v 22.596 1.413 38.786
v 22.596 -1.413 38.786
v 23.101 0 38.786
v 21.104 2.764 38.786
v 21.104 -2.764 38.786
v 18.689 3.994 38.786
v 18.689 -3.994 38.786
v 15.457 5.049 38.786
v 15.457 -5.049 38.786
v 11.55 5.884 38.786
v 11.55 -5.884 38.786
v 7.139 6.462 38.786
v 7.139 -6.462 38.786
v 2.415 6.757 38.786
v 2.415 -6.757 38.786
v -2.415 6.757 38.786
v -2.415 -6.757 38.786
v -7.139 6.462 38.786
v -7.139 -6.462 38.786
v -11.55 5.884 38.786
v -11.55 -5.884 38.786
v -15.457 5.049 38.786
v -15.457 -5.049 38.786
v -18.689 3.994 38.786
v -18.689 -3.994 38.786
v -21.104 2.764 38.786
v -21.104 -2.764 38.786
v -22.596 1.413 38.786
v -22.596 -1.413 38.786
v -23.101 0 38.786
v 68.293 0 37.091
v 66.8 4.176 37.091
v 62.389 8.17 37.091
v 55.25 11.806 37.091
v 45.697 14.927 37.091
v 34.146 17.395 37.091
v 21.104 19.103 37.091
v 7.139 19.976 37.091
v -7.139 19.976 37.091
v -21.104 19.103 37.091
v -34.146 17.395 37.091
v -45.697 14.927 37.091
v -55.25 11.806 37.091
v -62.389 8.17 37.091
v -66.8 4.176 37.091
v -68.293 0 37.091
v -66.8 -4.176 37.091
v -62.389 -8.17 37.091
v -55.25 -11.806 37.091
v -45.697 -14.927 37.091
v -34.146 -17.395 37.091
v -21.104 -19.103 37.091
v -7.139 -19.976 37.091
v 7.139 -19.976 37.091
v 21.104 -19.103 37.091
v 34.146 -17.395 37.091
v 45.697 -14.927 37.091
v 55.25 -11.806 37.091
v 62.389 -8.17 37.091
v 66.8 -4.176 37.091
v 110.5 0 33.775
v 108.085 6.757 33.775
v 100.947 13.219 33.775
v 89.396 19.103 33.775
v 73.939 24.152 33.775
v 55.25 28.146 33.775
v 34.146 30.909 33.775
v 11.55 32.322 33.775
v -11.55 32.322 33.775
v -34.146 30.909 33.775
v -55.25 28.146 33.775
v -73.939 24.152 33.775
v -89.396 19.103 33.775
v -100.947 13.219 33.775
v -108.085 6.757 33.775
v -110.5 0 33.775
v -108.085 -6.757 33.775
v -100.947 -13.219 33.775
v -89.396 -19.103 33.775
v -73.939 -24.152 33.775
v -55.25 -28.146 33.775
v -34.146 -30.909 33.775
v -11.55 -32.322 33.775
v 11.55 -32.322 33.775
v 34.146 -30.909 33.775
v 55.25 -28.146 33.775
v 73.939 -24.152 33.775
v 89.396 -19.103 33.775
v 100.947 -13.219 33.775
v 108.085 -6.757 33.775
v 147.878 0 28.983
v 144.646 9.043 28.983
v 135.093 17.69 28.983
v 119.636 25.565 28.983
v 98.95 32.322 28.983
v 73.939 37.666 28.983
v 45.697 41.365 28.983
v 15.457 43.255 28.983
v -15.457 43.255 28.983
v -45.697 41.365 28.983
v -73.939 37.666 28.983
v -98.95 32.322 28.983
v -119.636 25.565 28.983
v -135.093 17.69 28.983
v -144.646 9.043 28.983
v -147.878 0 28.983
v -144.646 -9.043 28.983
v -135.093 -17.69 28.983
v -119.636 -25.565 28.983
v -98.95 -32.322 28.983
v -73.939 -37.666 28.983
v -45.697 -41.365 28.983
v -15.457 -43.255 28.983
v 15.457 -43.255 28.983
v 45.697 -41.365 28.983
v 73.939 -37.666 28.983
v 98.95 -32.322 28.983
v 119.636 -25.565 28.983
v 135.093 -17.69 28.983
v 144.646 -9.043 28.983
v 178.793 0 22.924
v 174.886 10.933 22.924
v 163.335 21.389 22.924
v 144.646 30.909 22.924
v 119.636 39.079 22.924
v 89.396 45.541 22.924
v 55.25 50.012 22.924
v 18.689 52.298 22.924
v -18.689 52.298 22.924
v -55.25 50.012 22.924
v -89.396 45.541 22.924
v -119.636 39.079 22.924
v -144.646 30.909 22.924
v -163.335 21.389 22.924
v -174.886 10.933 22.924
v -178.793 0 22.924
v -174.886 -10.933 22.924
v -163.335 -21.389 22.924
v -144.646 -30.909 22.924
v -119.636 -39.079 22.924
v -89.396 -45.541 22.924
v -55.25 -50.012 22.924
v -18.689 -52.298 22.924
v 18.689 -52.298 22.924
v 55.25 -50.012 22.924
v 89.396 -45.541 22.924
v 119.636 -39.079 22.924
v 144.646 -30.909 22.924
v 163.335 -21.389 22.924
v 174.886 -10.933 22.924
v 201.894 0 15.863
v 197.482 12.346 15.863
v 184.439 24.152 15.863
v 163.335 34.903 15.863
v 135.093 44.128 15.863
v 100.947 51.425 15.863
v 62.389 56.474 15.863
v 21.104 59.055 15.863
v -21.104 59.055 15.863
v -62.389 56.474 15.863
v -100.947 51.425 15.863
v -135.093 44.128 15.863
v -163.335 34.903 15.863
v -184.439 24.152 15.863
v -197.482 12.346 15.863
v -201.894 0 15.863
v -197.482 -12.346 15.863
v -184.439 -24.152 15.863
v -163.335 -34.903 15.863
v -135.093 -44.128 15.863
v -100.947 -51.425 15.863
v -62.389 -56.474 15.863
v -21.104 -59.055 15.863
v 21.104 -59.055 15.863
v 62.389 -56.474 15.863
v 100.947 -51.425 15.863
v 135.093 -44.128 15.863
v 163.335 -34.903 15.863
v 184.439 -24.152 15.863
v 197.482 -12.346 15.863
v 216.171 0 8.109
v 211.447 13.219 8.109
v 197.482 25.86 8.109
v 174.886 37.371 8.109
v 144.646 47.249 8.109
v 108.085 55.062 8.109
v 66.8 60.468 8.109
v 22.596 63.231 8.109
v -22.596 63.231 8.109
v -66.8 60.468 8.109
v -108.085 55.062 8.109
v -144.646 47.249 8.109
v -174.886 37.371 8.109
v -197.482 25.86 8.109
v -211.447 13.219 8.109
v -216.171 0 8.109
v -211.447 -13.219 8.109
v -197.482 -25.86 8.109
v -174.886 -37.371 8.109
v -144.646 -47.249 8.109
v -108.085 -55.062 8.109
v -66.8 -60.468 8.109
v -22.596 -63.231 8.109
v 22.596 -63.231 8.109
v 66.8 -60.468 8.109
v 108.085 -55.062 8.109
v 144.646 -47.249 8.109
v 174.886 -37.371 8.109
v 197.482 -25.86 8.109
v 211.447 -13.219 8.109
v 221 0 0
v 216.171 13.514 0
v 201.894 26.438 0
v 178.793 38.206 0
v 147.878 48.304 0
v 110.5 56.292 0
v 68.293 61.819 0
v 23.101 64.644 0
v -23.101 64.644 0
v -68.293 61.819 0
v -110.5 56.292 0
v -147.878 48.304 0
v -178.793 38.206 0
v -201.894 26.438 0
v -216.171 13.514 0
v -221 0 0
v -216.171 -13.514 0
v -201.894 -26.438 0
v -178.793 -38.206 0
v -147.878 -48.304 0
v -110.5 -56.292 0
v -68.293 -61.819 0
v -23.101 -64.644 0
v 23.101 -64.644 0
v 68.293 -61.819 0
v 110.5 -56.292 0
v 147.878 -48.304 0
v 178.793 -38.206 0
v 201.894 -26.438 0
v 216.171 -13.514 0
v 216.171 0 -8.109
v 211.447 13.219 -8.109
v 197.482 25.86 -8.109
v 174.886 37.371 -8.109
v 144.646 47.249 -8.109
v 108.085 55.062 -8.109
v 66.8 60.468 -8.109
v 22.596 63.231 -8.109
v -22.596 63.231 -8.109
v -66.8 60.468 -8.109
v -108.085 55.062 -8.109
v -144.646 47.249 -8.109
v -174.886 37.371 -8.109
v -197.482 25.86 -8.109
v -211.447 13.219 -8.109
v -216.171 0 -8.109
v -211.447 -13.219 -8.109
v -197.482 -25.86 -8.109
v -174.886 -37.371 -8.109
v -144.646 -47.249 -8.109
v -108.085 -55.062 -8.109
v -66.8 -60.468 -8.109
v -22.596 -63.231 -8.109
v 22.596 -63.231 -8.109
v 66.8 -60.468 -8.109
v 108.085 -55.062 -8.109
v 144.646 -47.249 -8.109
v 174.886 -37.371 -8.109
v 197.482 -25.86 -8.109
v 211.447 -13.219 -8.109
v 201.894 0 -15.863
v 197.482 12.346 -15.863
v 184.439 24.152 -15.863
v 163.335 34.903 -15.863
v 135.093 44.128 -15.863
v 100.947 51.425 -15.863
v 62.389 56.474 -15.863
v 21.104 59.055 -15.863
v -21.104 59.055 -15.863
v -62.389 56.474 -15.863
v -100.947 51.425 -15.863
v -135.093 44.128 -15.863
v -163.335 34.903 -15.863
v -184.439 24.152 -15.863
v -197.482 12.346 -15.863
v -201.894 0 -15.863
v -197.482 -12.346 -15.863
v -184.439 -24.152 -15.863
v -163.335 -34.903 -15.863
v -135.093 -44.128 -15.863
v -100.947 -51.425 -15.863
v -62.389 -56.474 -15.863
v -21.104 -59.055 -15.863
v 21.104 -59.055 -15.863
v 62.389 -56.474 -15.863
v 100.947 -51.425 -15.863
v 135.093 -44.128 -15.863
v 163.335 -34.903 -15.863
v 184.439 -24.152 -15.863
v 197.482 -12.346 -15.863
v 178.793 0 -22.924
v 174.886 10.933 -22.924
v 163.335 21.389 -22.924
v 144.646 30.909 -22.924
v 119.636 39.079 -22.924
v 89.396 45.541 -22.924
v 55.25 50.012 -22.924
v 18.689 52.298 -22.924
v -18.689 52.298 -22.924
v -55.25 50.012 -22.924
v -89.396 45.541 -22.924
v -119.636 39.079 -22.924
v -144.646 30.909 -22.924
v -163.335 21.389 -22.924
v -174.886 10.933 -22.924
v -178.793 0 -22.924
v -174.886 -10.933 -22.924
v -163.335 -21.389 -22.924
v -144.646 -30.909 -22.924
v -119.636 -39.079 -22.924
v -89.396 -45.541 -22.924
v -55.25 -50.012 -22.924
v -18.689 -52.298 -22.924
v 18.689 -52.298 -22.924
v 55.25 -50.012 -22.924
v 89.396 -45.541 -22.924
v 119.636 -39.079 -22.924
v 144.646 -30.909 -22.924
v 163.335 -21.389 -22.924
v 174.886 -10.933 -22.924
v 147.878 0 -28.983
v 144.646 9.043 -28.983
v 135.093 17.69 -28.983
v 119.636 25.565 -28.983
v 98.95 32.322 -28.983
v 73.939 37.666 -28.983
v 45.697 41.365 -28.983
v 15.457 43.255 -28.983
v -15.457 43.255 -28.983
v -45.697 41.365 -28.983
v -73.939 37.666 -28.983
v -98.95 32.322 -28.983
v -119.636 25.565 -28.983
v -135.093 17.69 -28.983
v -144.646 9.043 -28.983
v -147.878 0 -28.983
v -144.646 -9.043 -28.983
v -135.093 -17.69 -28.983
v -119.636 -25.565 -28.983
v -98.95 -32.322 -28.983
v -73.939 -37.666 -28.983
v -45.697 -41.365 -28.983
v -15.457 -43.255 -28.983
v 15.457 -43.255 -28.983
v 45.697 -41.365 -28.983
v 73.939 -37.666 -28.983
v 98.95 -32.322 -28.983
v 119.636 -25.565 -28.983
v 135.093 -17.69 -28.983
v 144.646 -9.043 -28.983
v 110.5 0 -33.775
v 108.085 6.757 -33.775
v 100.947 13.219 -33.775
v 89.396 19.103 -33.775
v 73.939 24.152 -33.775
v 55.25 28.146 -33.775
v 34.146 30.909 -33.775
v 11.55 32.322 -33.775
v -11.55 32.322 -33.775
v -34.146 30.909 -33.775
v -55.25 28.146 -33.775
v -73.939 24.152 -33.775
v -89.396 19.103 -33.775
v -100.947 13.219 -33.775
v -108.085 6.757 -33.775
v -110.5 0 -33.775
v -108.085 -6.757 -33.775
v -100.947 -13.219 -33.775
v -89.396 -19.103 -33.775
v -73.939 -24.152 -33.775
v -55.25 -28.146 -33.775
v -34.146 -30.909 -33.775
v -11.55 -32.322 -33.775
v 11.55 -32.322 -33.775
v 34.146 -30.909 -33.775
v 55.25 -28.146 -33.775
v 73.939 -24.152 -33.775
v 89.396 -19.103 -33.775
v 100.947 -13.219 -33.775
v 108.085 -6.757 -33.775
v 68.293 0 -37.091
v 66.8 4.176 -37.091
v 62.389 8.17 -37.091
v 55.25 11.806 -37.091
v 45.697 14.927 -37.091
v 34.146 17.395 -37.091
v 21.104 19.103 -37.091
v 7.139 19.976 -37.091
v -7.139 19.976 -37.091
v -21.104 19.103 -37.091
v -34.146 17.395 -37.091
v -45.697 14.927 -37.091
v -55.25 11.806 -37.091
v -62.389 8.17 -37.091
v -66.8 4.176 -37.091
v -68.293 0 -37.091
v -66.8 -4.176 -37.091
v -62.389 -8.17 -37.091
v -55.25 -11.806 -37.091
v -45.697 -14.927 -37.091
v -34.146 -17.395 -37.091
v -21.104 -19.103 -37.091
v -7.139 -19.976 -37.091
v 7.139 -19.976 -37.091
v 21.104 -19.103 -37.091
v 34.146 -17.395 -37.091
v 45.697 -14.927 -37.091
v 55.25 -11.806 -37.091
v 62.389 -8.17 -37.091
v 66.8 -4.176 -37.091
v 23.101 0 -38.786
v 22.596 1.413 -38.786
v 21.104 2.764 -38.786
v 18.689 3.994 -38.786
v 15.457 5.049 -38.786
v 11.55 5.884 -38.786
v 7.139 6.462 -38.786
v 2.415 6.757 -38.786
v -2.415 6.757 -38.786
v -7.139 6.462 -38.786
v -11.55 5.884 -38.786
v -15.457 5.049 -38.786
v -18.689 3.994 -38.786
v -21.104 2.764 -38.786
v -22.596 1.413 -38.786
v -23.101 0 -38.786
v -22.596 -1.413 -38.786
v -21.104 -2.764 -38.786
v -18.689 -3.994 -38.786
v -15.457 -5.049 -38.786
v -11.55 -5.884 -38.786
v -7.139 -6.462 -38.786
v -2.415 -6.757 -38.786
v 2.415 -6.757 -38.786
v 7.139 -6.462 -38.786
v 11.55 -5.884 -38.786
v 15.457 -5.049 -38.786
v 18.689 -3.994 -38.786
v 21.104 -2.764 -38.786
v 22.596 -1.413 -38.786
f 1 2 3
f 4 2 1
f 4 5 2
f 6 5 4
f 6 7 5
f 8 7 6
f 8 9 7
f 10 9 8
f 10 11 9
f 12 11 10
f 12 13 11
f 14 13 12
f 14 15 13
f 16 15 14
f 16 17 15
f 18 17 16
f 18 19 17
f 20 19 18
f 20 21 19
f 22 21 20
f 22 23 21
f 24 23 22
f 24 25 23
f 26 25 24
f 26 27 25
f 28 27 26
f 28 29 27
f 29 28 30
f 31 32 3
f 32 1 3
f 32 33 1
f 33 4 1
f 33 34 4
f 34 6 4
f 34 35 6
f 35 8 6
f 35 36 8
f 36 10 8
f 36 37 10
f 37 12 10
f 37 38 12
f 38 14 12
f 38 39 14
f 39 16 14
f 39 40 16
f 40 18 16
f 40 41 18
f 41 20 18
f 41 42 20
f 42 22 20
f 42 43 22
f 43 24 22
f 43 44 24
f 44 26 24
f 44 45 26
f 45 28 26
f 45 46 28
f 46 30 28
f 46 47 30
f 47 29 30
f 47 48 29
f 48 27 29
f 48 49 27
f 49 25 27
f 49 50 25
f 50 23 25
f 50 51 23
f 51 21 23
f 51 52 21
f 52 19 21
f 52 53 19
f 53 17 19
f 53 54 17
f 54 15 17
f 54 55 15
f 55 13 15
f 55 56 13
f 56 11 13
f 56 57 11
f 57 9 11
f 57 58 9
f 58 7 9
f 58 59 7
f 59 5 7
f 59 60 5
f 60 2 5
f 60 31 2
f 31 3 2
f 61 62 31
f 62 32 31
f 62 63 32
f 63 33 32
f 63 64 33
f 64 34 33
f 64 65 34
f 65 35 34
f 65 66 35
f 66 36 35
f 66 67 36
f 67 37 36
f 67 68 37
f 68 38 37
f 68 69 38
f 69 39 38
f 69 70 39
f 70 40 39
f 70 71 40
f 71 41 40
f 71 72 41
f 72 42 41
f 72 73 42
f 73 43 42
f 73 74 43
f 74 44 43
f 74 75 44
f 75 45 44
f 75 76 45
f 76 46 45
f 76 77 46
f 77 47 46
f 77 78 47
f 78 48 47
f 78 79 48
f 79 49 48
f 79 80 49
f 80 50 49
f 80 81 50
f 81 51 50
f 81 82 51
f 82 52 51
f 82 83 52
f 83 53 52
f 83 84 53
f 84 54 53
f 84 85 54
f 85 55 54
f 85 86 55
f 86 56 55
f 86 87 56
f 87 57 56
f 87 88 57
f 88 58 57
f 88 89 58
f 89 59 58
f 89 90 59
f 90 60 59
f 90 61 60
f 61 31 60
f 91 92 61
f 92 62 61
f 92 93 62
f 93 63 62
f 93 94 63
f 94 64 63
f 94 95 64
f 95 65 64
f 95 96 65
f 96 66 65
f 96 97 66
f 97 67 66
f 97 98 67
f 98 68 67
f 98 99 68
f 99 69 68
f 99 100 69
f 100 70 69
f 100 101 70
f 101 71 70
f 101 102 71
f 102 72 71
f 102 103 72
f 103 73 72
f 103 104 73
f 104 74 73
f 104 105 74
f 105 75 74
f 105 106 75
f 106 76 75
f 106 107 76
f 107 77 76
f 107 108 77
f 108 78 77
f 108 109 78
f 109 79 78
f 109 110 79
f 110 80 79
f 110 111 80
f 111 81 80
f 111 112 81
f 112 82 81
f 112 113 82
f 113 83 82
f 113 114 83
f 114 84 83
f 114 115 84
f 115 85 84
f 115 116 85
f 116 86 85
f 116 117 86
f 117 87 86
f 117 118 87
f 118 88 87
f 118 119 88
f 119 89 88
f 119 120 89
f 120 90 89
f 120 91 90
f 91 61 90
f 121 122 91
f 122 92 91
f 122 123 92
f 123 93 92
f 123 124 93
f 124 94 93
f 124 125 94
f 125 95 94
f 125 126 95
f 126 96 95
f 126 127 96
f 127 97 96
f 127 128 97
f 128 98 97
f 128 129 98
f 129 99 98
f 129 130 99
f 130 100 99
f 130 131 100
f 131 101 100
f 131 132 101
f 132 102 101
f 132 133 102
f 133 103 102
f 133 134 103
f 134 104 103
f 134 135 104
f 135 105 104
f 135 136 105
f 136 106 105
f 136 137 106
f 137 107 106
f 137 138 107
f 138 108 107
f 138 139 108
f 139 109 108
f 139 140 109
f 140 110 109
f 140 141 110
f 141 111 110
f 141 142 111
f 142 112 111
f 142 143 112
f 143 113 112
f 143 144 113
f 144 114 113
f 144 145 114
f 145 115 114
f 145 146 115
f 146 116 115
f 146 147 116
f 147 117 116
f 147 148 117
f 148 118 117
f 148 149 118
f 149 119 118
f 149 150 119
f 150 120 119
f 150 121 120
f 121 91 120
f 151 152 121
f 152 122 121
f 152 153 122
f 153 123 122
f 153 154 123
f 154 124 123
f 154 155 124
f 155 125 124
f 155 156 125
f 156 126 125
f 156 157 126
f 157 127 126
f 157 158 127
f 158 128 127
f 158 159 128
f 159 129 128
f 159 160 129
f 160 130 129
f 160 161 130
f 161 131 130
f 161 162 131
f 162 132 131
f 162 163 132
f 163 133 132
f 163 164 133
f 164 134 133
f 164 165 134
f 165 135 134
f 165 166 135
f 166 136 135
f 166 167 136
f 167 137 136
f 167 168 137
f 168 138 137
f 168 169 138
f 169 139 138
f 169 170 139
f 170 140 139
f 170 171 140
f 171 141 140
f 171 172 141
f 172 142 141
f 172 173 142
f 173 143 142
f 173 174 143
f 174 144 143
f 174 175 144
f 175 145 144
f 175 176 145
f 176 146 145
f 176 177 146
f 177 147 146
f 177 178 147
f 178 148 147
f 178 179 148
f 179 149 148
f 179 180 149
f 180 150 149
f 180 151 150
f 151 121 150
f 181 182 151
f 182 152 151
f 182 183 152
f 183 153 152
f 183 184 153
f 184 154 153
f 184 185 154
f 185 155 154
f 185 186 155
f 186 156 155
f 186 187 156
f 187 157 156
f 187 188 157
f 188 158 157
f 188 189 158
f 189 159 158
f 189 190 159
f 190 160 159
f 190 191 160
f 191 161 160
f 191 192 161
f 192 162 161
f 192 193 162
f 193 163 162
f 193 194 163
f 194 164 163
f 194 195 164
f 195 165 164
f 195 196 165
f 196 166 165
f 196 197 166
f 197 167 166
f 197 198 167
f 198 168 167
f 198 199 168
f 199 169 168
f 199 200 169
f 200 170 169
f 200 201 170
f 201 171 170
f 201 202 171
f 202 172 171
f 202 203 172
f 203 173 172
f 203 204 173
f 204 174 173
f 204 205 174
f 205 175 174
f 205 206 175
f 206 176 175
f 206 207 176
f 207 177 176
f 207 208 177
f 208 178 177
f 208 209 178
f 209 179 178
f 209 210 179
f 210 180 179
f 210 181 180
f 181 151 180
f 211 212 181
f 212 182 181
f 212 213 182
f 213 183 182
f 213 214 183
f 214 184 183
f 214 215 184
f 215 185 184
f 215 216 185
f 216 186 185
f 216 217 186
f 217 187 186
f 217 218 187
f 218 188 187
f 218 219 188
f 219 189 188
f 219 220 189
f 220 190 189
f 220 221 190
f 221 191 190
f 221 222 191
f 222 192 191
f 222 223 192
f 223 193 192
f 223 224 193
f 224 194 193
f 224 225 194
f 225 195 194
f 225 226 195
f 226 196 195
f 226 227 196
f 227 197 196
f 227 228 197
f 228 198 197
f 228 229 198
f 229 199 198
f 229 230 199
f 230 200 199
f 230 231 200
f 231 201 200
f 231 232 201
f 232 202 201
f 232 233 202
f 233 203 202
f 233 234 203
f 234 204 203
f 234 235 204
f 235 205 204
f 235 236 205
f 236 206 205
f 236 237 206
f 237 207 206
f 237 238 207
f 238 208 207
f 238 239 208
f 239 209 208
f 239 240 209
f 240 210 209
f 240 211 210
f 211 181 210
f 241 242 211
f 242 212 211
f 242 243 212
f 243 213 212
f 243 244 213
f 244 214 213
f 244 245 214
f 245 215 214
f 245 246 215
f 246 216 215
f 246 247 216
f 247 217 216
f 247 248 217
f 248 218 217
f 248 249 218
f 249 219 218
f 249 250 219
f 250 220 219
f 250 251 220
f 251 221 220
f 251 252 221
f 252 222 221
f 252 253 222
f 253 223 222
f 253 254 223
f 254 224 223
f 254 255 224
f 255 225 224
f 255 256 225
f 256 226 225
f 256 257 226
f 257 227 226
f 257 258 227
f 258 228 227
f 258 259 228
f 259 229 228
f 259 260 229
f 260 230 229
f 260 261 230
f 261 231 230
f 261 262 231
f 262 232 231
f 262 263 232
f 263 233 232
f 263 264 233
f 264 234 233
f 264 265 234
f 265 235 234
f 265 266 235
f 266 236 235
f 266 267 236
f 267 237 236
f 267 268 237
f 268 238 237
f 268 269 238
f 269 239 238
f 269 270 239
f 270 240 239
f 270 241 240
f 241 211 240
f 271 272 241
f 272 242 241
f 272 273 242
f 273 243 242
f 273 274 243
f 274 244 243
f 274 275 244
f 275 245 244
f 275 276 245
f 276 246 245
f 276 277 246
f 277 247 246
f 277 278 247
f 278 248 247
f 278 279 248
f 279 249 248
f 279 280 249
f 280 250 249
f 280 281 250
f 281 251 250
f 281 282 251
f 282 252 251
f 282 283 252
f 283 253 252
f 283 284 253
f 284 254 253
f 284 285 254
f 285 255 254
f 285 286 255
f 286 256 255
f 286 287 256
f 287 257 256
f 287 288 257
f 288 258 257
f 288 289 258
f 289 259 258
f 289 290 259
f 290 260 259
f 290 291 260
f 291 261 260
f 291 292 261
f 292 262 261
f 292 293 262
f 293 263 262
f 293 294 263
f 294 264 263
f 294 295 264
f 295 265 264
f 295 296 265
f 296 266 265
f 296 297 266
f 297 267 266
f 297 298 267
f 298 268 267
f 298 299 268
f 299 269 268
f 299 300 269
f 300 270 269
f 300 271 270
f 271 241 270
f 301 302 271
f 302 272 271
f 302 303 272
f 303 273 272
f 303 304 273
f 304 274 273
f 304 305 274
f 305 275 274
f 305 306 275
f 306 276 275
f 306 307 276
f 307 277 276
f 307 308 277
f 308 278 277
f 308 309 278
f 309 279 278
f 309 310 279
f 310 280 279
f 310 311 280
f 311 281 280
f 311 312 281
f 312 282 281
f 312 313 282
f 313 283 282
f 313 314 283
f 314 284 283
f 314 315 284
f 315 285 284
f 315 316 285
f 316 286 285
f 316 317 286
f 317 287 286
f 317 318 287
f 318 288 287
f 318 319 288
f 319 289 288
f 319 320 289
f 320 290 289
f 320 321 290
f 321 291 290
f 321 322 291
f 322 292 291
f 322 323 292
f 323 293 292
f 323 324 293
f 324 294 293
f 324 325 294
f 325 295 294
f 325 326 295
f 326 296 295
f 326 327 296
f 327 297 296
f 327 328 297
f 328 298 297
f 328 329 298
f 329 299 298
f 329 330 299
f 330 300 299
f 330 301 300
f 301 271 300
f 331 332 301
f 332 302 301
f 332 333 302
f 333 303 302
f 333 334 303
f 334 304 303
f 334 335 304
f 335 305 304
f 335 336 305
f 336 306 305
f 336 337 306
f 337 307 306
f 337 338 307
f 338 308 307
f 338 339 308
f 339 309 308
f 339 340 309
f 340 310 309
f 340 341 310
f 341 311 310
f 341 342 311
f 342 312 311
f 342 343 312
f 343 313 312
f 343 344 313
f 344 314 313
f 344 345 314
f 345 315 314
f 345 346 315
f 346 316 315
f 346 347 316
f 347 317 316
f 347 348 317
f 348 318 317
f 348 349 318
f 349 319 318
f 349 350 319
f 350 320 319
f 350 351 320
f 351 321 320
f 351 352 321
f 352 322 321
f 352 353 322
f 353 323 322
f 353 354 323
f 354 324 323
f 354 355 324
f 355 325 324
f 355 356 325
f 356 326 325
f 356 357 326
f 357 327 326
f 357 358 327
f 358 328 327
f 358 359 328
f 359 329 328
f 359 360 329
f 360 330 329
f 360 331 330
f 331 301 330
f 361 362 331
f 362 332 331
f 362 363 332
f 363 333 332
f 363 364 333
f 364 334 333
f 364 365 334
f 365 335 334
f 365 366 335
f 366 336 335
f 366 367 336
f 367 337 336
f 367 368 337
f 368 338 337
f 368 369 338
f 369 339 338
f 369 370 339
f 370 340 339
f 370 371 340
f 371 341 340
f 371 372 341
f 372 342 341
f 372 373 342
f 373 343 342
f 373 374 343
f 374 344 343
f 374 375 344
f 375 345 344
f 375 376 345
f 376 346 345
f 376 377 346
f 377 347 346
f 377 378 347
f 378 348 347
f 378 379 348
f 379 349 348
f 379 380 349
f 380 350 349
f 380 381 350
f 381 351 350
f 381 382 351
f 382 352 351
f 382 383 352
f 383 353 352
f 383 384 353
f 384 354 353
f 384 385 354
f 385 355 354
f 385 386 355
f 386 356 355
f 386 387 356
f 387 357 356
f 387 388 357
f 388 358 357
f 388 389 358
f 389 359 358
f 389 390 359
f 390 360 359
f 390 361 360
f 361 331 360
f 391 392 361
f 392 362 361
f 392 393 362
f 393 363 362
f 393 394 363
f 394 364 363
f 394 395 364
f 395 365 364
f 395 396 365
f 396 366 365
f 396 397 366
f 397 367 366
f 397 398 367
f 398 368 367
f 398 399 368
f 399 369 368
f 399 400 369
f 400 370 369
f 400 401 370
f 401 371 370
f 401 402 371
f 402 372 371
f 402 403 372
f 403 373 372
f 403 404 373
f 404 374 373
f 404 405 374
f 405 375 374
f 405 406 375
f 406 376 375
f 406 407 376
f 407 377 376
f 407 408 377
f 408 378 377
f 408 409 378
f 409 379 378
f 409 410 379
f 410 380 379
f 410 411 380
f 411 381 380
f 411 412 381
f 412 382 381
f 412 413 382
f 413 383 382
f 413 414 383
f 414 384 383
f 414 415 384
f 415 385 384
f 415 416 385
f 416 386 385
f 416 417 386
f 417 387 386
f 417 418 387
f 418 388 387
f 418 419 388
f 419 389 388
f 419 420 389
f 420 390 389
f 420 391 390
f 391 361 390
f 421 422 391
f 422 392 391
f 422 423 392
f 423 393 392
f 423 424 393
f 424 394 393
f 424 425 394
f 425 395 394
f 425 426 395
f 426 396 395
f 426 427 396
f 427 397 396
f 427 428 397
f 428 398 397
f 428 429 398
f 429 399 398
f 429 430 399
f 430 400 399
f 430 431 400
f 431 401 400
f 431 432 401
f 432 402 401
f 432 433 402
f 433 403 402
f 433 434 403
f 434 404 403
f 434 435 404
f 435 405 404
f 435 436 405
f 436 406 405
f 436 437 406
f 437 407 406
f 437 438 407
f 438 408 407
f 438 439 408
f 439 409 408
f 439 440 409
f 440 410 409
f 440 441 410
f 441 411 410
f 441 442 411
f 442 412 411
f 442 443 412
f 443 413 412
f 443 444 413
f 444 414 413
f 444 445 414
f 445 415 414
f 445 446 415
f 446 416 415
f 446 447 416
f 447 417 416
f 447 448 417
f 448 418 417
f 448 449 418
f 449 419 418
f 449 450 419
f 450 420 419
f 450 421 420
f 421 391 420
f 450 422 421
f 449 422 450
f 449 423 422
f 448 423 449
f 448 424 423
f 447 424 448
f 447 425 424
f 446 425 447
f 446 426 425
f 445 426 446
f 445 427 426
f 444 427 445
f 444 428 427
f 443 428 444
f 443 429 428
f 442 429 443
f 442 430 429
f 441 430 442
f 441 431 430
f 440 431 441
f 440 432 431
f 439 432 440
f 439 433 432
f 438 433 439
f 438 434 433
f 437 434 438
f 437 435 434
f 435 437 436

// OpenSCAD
// Generated by SolidPython 1.0.1 on 2020-07-29 00:46:52


scale(v = [17, 5, 3]) {
	sphere(r = 13);
}
/***********************************************
*********      SolidPython code:      **********
************************************************
 
# import packages: SolidPython
from solid import *
from solid.utils import *
from itertools import chain, combinations, permutations


class Resize:

    def __init__(self, scad_file):
        self.scad_file = scad_file
        #self.scad_file = import_scad(scad_file)
        # cone/cylinder param:
        self.r1 = 0
        self.r2 = 0
        self.h = 0
        # rectangular prism param:
        self.w = 0
        self.l = 0
        # ellipse param:
        self.r = 0

    # import OpenScad code (file name corresponds to shape)


    # classify shape + parameters
    def assign(self, param1, param2, param3):
        if self.scad_file == 'cone.scad':
            self.r1 = param1
            self.r2 = param2
            self.h = param3
        elif self.scad_file == 'cylinder.scad':
            self.r1 = param1
            self.r2 = param2
            self.h = param3
        elif self.scad_file == 'rectangularPrism.scad':
            self.h = param1
            self.l = param2
            self.w = param3
        else:
            self.r = param1
            self.h = param2

    # resize parameters
    def iterate(self):
        x = range(3, 20, 2)
        i = 1
        if self.scad_file == 'cone.scad':
            tempList = list(permutations(x, 2))
            for temp in tempList:
                param1 = temp[0]
                param2 = temp[1]
                filepath = 'produced_scad_files/' + 'cone' + str(param1) + '_' + str(param2) + '_' + '.scad'
                scad_render_to_file(cylinder(h=param1, r1=param2, r2=0), filepath)

        elif self.scad_file == 'cylinder.scad':
            tempList = list(permutations(x, 3))
            for temp in tempList:
                param1 = temp[0]
                param2 = temp[1]
                filepath = 'produced_scad_files/' + 'cylinder' + str(param1) + '_' + str(param2) + '_' + '.scad'
                scad_render_to_file(cylinder(h=param1, r1=param2, r2=param2), filepath)

        elif self.scad_file == 'rectangularPrism.scad':
            tempList = list(permutations(x, 3))
            for temp in tempList:
                param1 = temp[0]
                param2 = temp[1]
                param3 = temp[2]
                filepath = 'produced_scad_files/' + 'rectangularPrism' + str(param1) + '_' + str(param2) + '_' + str(
                    param3) + '.scad'
                scad_render_to_file(cube(size=(param1, param2, param3)), filepath)

        elif self.scad_file == 'ellipse.scad':
            tempList = list(permutations(x, 4))
            for temp in tempList:
                param1 = temp[0]
                param2 = temp[1]
                param3 = temp[2]
                param4 = temp[3]
                filepath = 'produced_scad_files/' + 'ellipse' + str(param1) + '_' + str(param2) + '_' + str(param3) + '_' + str(param4) + '.scad'
                scad_render_to_file(scale([param1, param2, param3])(sphere(r=param4)), filepath)

    def render_to_scadfile(self):
        scad_render_to_file(scad, 'example.scad') 
 
************************************************/
